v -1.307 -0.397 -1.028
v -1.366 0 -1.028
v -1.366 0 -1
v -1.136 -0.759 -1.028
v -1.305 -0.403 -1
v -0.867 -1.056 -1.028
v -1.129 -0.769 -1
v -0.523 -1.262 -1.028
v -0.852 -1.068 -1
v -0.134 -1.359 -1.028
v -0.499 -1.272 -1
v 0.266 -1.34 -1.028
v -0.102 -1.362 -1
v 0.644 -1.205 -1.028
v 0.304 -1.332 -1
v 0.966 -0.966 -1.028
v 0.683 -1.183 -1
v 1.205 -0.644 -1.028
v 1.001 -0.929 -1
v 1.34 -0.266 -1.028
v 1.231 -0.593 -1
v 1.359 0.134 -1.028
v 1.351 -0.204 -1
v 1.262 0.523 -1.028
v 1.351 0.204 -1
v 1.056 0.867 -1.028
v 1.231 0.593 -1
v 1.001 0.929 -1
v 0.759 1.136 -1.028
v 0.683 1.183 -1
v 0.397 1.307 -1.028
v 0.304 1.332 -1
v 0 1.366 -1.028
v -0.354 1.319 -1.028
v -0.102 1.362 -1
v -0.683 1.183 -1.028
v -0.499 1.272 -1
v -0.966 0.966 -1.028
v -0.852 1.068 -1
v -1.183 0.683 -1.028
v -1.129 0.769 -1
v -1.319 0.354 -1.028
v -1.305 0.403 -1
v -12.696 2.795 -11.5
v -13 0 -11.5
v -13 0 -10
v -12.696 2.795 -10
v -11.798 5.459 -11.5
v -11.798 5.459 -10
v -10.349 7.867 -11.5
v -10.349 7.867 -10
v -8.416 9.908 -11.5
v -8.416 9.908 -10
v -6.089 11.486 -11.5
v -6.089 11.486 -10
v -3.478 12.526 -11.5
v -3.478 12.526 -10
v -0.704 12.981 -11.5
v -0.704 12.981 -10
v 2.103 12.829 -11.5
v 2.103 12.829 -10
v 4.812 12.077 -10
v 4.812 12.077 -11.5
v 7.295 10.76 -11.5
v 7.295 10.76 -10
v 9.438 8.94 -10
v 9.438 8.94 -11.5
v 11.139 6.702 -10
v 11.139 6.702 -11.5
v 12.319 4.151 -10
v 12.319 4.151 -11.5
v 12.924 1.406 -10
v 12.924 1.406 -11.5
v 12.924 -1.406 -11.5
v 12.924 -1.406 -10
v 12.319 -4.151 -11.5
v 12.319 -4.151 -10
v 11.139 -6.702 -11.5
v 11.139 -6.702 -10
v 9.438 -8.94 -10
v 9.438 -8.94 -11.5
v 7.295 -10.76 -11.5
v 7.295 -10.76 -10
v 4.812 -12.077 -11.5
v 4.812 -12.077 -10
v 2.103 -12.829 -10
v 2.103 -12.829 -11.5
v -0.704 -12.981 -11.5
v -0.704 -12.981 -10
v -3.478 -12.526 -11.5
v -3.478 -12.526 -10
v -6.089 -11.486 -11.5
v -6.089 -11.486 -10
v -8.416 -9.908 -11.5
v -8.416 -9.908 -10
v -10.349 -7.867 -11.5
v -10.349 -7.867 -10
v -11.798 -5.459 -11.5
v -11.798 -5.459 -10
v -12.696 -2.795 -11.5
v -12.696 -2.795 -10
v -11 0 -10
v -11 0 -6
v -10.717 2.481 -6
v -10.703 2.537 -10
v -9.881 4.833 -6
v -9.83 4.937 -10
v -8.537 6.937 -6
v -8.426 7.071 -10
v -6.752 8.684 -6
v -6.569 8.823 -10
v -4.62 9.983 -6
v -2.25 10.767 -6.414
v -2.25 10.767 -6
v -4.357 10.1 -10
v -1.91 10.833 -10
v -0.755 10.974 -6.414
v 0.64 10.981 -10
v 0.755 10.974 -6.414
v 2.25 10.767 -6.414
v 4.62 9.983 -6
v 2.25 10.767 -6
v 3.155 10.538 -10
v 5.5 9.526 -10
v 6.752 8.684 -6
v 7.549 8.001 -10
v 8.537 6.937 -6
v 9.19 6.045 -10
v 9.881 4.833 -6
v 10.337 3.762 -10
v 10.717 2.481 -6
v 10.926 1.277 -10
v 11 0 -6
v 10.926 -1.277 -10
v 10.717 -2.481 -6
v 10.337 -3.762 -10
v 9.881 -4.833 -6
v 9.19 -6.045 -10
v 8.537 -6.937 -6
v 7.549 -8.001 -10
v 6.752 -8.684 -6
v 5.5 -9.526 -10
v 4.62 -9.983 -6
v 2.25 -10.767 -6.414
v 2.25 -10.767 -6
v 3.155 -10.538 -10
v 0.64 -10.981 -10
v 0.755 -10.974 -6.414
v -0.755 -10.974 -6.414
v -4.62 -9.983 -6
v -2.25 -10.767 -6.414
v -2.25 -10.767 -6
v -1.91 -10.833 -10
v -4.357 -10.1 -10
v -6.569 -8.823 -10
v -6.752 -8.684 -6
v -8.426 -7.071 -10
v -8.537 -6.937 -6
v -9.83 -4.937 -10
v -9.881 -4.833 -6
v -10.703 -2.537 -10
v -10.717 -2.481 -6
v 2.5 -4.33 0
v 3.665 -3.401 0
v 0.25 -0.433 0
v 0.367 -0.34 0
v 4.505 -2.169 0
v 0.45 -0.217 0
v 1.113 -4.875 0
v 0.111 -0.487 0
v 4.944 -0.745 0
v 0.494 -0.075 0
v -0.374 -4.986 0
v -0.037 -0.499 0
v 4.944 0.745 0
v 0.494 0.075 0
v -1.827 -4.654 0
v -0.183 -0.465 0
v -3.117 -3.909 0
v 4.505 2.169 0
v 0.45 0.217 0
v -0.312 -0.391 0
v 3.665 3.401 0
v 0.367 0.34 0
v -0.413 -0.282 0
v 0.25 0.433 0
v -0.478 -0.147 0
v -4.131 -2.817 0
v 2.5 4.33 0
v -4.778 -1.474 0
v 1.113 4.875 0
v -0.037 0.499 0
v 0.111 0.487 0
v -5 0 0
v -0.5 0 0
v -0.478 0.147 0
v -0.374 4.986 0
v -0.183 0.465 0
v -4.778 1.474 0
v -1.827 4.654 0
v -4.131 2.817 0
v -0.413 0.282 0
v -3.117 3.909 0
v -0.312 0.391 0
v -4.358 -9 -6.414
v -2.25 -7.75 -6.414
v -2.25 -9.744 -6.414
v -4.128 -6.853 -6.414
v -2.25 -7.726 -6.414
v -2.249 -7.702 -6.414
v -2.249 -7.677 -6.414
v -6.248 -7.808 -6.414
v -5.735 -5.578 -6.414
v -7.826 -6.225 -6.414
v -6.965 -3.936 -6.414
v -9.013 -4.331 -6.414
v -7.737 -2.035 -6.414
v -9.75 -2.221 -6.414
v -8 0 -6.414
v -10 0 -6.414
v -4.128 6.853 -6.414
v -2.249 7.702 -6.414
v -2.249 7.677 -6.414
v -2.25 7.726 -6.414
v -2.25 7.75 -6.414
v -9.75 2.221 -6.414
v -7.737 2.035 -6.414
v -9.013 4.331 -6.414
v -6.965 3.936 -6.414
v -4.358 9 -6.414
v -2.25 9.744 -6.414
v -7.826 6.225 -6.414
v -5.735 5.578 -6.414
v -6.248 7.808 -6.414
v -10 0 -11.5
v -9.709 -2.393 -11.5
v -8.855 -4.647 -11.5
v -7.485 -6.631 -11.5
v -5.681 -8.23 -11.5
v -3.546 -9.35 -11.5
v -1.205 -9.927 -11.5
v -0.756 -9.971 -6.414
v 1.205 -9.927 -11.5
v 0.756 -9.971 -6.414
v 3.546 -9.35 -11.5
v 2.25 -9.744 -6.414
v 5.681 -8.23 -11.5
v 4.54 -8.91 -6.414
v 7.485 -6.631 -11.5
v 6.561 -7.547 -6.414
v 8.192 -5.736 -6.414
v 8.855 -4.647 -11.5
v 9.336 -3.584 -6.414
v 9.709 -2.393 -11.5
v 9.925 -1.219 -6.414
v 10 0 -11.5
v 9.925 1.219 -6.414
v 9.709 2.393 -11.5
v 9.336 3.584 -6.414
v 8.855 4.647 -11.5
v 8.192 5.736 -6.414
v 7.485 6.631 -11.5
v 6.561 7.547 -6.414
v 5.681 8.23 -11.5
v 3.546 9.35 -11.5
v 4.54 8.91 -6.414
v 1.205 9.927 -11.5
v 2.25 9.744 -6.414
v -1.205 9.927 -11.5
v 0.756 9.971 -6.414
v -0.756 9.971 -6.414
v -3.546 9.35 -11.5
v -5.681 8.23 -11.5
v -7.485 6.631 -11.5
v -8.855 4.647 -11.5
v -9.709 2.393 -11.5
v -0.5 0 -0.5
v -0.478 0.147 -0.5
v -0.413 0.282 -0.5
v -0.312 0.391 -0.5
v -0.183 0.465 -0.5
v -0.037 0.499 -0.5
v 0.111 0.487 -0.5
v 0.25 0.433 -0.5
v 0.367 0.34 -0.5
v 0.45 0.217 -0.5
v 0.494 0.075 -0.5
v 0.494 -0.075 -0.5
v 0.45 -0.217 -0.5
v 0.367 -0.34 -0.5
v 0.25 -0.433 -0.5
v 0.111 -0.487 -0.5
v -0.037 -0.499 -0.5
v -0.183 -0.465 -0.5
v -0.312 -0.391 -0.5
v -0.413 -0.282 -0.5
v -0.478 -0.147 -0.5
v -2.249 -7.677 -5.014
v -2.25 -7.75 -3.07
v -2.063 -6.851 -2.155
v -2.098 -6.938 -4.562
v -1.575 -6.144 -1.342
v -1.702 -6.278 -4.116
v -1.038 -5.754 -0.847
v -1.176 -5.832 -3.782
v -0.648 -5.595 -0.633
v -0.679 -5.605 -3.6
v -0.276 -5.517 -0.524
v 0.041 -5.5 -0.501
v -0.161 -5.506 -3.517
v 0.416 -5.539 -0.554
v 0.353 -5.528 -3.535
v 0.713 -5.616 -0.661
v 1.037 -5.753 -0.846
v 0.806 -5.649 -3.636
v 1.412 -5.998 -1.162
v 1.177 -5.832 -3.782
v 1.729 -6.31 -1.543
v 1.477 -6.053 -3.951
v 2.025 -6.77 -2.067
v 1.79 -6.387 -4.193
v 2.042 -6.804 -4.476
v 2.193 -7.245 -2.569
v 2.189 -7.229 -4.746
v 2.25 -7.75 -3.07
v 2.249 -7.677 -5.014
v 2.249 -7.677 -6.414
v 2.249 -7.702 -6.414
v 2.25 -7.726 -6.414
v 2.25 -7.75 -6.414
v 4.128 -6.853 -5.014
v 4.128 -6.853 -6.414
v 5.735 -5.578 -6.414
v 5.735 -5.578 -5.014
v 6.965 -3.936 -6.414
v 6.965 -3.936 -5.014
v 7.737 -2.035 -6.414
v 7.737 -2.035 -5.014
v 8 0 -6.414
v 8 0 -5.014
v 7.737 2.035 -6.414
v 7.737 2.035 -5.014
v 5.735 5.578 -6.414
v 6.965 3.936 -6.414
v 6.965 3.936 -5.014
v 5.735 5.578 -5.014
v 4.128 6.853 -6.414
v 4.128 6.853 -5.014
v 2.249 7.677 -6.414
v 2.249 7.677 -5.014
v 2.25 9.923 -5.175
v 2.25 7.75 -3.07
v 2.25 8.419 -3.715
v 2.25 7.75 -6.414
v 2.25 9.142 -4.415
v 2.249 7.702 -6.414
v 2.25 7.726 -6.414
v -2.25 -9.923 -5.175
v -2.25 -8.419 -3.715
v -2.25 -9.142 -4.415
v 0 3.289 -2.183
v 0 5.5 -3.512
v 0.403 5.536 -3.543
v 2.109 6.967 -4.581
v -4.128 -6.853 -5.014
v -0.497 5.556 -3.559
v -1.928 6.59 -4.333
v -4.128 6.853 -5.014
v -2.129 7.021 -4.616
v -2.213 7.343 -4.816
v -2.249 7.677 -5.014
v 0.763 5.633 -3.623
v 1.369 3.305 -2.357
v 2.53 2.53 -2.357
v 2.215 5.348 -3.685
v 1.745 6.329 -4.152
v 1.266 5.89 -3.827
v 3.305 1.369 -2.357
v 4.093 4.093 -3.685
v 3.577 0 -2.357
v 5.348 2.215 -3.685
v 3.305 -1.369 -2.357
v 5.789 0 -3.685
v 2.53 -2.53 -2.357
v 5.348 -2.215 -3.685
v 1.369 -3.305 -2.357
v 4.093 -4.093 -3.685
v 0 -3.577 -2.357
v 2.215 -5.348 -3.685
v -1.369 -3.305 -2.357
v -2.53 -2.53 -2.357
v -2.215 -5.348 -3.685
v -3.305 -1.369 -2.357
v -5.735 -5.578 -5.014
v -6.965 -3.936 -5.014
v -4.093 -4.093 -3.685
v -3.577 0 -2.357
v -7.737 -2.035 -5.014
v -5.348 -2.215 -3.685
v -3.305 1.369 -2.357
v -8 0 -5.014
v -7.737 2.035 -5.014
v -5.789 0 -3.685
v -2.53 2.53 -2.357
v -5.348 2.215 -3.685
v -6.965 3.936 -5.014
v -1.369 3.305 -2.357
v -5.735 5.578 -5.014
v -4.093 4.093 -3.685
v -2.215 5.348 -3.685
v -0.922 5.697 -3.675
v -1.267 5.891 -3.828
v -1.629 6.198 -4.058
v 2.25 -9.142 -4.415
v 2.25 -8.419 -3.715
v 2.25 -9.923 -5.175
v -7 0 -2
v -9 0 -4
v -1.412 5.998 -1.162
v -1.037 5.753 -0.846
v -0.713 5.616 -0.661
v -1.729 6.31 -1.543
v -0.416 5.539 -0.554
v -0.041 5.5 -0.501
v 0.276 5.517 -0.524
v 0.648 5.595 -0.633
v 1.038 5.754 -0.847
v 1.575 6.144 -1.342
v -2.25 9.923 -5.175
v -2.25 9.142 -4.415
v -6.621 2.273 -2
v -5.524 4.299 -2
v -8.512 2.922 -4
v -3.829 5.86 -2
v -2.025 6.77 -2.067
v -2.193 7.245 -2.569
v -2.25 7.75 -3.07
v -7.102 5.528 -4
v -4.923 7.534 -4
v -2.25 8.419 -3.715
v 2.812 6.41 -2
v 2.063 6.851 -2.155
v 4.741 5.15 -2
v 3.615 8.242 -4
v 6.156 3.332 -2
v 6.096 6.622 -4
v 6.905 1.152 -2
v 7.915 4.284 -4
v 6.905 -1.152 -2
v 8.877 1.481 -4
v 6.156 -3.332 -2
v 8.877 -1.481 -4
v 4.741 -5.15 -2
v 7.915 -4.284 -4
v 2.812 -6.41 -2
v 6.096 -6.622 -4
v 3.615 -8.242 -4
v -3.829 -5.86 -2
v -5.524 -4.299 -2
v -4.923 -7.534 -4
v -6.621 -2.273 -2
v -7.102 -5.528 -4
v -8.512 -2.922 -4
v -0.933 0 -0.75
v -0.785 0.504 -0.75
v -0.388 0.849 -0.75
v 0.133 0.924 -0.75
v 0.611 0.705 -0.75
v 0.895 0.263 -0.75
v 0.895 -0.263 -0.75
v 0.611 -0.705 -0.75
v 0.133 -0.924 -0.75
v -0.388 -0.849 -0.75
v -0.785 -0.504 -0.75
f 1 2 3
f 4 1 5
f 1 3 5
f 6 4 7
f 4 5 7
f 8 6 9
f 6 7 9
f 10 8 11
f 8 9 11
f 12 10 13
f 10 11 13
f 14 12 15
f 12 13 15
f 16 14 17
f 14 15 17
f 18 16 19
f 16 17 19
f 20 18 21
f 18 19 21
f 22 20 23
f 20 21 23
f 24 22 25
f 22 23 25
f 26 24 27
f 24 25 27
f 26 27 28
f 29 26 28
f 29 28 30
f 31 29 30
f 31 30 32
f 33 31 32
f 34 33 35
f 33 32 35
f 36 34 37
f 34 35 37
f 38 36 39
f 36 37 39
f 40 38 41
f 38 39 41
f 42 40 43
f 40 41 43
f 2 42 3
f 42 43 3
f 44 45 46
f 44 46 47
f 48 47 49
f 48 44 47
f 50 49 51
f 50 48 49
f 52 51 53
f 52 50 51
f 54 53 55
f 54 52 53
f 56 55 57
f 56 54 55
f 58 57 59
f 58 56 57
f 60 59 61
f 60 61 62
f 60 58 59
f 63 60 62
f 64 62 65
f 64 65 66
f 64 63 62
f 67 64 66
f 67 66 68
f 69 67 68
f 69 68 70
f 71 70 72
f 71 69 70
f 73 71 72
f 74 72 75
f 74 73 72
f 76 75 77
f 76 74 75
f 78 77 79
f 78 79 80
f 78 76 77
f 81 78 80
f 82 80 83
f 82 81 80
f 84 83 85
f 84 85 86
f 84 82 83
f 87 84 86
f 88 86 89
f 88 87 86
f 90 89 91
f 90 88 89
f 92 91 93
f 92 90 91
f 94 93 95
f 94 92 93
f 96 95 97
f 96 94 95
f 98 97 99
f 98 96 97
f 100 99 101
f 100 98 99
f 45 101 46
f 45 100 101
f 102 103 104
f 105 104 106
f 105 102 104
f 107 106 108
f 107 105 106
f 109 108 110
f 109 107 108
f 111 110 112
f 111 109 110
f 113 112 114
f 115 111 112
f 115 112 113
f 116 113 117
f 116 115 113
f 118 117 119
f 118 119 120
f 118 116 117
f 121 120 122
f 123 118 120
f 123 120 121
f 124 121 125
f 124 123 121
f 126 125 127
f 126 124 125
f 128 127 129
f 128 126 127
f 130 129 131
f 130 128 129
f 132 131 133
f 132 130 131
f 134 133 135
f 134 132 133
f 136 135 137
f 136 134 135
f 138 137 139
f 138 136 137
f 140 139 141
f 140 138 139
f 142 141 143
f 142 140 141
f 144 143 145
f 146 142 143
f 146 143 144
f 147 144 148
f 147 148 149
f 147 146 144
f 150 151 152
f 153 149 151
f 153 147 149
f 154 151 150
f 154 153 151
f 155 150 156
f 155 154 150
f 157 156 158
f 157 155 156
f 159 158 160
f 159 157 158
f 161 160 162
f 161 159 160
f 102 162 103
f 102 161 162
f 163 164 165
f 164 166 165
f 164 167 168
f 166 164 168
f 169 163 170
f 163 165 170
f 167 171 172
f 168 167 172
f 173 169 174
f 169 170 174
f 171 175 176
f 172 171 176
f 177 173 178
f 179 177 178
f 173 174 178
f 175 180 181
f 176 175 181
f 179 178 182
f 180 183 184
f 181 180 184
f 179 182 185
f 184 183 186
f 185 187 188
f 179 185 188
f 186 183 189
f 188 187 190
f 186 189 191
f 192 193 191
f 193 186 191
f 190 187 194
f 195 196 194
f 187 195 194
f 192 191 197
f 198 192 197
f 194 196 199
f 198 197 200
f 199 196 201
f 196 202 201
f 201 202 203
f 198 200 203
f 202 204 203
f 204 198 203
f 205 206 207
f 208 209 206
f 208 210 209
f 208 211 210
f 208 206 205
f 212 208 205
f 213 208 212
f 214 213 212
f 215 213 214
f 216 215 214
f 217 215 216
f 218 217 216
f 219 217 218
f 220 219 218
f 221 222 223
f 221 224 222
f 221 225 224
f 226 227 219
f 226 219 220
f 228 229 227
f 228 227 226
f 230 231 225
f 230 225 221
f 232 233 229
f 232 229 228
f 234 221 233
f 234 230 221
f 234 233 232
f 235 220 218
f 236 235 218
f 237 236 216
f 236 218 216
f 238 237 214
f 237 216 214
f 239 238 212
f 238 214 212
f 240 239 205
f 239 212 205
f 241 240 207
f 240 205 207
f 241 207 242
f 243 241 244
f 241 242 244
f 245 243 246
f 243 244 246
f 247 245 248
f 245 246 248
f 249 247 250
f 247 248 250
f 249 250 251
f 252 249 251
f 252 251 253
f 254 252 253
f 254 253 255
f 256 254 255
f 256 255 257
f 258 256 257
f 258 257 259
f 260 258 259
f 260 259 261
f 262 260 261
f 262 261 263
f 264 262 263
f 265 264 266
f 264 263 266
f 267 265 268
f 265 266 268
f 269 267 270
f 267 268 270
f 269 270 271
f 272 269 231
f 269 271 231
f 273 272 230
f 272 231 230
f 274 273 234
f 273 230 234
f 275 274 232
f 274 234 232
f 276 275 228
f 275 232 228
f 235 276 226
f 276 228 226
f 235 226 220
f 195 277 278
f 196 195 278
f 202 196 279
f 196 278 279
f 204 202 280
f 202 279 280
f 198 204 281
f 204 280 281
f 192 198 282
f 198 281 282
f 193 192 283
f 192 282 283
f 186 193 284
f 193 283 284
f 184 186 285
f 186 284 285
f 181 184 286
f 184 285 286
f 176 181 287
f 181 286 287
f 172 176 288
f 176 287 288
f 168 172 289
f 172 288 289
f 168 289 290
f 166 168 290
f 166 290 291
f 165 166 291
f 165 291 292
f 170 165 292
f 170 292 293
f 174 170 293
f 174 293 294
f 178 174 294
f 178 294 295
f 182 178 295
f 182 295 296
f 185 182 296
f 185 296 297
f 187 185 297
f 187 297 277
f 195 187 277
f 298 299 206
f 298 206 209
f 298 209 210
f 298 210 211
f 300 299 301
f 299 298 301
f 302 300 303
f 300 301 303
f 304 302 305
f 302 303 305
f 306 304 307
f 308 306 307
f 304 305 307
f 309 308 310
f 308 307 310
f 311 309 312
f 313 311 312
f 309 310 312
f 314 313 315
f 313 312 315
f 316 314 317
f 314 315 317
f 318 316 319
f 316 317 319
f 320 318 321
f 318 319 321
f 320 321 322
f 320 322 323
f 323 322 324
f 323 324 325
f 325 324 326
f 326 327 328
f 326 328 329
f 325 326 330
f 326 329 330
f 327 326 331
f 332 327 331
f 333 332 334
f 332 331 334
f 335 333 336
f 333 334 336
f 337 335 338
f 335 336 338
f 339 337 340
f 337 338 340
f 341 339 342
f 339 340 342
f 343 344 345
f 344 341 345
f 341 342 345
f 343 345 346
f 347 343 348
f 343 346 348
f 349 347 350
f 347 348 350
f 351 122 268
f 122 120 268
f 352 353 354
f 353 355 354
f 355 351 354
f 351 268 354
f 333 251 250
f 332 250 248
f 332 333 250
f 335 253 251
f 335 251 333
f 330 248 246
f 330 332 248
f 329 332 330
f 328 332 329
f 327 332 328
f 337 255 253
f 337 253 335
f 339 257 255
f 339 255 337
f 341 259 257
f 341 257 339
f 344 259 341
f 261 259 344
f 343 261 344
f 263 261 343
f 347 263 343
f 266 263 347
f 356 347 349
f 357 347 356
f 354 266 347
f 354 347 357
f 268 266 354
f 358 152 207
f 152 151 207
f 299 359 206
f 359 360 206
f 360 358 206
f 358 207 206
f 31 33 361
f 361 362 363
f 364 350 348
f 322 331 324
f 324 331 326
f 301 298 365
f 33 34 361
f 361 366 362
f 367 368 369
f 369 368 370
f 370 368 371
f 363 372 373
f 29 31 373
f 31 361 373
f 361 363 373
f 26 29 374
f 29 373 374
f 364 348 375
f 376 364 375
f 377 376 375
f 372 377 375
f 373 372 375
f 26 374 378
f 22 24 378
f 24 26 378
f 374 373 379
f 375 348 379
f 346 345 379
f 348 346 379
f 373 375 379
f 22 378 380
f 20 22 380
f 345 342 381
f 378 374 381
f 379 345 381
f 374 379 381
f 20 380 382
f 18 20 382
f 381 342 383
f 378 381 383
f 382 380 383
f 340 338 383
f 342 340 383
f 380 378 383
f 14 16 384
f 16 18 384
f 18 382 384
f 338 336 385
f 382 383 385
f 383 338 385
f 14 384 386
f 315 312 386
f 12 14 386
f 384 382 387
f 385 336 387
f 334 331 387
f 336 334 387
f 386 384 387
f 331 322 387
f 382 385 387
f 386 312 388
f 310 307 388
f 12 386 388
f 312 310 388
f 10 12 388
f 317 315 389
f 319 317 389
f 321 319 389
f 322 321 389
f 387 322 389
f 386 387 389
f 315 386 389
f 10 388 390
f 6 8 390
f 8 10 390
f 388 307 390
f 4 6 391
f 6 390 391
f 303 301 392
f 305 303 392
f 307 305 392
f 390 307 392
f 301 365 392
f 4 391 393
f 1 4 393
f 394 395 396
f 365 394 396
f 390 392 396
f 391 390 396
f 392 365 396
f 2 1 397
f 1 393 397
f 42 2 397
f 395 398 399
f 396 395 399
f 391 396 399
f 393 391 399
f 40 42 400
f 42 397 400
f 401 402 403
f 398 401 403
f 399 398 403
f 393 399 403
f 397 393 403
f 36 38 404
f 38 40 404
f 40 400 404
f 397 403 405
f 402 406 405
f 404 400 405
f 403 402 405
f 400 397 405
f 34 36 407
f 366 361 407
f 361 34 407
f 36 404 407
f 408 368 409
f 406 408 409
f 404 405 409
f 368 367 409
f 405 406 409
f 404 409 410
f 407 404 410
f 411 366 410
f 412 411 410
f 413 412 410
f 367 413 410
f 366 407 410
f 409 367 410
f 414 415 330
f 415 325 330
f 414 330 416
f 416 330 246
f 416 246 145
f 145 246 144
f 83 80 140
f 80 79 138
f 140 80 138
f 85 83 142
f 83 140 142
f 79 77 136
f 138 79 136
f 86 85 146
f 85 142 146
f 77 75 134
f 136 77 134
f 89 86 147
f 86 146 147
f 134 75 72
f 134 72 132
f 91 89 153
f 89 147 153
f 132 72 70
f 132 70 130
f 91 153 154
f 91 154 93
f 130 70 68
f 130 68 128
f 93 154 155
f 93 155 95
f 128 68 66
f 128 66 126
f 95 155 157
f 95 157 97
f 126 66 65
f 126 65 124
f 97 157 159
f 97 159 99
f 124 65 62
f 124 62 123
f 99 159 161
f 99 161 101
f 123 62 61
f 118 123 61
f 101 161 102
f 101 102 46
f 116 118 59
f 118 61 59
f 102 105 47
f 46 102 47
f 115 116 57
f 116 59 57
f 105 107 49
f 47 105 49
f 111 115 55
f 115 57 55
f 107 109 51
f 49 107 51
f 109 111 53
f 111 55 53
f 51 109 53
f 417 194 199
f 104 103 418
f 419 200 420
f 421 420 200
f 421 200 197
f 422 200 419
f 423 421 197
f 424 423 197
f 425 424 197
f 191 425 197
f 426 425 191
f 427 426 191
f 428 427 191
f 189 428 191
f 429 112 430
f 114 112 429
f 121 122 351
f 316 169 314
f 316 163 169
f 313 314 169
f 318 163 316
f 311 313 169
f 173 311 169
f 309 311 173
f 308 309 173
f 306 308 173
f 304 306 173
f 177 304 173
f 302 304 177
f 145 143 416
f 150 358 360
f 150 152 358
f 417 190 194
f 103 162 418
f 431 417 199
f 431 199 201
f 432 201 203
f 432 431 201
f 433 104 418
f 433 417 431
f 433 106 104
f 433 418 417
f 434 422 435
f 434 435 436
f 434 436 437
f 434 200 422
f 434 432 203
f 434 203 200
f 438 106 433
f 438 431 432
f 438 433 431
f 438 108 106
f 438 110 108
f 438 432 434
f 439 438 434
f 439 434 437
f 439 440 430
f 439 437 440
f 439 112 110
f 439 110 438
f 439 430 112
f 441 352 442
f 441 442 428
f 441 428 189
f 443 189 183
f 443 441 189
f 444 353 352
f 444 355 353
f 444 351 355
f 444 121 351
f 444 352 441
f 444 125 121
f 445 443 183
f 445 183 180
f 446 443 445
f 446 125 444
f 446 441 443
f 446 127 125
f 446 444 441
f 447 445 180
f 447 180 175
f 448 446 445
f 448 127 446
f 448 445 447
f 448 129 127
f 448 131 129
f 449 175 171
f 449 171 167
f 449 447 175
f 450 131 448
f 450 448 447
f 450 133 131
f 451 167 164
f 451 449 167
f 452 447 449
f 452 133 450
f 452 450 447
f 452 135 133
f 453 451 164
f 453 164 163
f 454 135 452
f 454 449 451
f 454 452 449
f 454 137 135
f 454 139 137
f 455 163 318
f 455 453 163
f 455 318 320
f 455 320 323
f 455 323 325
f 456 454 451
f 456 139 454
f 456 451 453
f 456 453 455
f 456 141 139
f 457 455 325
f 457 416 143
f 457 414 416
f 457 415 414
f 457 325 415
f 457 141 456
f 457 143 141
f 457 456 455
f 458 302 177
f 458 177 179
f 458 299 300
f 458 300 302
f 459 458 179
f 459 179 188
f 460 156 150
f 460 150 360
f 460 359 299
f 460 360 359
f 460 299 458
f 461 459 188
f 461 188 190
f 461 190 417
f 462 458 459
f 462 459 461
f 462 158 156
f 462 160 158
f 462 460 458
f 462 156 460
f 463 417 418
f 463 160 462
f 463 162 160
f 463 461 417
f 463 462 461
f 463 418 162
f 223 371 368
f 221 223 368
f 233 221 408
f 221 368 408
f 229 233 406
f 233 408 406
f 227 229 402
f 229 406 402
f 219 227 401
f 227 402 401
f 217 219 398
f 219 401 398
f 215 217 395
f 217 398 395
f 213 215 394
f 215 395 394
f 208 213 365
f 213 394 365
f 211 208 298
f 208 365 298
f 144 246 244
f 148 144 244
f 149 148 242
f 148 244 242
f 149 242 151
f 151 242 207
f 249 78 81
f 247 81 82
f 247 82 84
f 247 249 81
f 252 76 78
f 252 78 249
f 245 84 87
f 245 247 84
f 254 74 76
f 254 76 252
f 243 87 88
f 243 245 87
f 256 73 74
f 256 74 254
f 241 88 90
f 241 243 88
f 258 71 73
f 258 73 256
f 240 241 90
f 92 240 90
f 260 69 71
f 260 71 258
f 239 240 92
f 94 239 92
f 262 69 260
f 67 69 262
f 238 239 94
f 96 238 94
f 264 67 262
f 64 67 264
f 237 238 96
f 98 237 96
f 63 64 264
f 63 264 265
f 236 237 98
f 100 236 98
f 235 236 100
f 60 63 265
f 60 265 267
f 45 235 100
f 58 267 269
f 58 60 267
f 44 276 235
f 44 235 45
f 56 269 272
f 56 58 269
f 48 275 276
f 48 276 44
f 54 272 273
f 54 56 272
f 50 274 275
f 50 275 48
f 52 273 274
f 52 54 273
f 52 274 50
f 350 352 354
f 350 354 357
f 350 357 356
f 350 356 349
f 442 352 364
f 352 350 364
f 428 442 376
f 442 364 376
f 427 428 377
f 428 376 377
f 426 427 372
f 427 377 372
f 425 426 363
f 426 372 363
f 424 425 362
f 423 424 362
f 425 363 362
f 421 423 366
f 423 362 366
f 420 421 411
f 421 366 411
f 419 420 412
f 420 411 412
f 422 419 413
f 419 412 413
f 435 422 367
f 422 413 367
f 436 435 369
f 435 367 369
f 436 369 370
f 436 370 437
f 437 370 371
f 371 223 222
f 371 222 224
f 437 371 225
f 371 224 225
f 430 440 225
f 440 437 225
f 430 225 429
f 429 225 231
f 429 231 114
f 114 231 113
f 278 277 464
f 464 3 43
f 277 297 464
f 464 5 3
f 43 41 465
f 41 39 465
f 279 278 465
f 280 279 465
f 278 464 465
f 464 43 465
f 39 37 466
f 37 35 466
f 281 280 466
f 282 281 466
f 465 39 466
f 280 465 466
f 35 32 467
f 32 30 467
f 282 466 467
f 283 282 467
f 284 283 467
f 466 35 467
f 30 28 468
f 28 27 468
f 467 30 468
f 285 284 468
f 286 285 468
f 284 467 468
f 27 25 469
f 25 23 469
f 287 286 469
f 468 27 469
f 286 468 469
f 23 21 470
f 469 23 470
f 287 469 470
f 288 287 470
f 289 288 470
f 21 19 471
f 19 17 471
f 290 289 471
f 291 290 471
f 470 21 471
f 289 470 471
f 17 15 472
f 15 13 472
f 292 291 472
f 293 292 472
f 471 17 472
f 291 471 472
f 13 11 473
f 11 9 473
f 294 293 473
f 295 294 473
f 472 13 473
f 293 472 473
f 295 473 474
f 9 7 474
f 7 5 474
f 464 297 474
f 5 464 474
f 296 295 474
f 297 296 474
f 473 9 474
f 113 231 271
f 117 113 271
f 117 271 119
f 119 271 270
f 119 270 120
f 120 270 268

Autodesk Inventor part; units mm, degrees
ref_plane "YZ Plane" through (0, 0, 0) normal (1, 0, 0) x (0, 1, 0)
ref_plane "XZ Plane" through (0, 0, 0) normal (0, 1, 0) x (-1, 0, 0)
sketch "Sketch1" plane through (0, 0, 0) normal (0, 1, 0) x (-1, 0, 0)
  line L0 (1.366, -1) -> (4.5858, -1)
  line L1 (5, 0) -> (0.5, 0)
  line L2 (4.5858, -1) -> (10, -6.4142)
  line L3 (5, 0) -> (11, -6)
  line L4 (11, -6) -> (11, -10)
  line L5 (11, -10) -> (13, -10)
  line L6 (13, -10) -> (13, -11.5)
  line L7 (13, -11.5) -> (10, -11.5)
  line L8 (10, -11.5) -> (10, -6.4142)
  line L9 (0, 0) -> (0, -4.2235)
  line L10 (10, -6.4142) -> (1.366, -6.4142)
  line L11 (1.366, -6.4142) -> (1.366, -1)
  line L12 (0.5, 0) -> (0.5, -0.5)
  line L13 (0.5, -0.5) -> (1.366, -1)
  dimension "d3" = 26
  dimension "d5" = 20
  dimension "d6" = 1
  dimension "d7" = 135
  dimension "d8" = 1
  dimension "d9" = 10
  dimension "d10" = 11.5
  dimension "d11" = 1.5
  dimension "d32" = 1
  dimension "d33" = 1
  dimension "d34" = 0.5
  dimension "d35" = 30
revolve "Revolution1" add sketch "Sketch1" angle 360 about axis through (0, 0, 0) along (0, 0, -1)
sketch "Sketch4" plane through (0, 0, -6.4142) normal (0, 0, -1) x (-1, 0, 0)
  circle A0 centre (0, 0) radius 1.366 projected
hole "Hole2" at (0, 0, -6.4142) direction (0, 0, 1) diameter 16 depth 1.4 tip angle 118
ref_plane "Work Plane2" through (0, 0, -6.4142) normal (0, 0, -1) x (-1, 0, 0)
sketch "Sketch5" plane through (0, 0, -6.4142) normal (0, 0, -1) x (-1, 0, 0)
  circle A0 centre (0, 0) radius 10 projected
  line L0 (0, -13.75) -> (0, -7.75) construction
  line L1 (2.25, -13.75) -> (2.25, -7.75)
  line L2 (-2.25, -7.75) -> (-2.25, -13.75)
  arc A1 (-2.25, -13.75) -> (2.25, -13.75) centre (0, -13.75) ccw
  arc A2 (2.25, -7.75) -> (-2.25, -7.75) centre (0, -7.75) ccw
  point P0 (0, -10.75)
  dimension "d37" = 4.5
  dimension "d38" = 6
extrude "Extrusion1" cut sketch "Sketch5" against normal blind 10 contours L2 A2 L1 A0 | A0 L1 A1 L2 picked at (-0.2519, -8.4905)
pattern_circular "Circular Pattern2" count 2 over 360 about axis through (0, 0, -8) along (0, 0, -1) of "Extrusion1"
properties part number "016" material "Stainless Steel, Austenitic"
